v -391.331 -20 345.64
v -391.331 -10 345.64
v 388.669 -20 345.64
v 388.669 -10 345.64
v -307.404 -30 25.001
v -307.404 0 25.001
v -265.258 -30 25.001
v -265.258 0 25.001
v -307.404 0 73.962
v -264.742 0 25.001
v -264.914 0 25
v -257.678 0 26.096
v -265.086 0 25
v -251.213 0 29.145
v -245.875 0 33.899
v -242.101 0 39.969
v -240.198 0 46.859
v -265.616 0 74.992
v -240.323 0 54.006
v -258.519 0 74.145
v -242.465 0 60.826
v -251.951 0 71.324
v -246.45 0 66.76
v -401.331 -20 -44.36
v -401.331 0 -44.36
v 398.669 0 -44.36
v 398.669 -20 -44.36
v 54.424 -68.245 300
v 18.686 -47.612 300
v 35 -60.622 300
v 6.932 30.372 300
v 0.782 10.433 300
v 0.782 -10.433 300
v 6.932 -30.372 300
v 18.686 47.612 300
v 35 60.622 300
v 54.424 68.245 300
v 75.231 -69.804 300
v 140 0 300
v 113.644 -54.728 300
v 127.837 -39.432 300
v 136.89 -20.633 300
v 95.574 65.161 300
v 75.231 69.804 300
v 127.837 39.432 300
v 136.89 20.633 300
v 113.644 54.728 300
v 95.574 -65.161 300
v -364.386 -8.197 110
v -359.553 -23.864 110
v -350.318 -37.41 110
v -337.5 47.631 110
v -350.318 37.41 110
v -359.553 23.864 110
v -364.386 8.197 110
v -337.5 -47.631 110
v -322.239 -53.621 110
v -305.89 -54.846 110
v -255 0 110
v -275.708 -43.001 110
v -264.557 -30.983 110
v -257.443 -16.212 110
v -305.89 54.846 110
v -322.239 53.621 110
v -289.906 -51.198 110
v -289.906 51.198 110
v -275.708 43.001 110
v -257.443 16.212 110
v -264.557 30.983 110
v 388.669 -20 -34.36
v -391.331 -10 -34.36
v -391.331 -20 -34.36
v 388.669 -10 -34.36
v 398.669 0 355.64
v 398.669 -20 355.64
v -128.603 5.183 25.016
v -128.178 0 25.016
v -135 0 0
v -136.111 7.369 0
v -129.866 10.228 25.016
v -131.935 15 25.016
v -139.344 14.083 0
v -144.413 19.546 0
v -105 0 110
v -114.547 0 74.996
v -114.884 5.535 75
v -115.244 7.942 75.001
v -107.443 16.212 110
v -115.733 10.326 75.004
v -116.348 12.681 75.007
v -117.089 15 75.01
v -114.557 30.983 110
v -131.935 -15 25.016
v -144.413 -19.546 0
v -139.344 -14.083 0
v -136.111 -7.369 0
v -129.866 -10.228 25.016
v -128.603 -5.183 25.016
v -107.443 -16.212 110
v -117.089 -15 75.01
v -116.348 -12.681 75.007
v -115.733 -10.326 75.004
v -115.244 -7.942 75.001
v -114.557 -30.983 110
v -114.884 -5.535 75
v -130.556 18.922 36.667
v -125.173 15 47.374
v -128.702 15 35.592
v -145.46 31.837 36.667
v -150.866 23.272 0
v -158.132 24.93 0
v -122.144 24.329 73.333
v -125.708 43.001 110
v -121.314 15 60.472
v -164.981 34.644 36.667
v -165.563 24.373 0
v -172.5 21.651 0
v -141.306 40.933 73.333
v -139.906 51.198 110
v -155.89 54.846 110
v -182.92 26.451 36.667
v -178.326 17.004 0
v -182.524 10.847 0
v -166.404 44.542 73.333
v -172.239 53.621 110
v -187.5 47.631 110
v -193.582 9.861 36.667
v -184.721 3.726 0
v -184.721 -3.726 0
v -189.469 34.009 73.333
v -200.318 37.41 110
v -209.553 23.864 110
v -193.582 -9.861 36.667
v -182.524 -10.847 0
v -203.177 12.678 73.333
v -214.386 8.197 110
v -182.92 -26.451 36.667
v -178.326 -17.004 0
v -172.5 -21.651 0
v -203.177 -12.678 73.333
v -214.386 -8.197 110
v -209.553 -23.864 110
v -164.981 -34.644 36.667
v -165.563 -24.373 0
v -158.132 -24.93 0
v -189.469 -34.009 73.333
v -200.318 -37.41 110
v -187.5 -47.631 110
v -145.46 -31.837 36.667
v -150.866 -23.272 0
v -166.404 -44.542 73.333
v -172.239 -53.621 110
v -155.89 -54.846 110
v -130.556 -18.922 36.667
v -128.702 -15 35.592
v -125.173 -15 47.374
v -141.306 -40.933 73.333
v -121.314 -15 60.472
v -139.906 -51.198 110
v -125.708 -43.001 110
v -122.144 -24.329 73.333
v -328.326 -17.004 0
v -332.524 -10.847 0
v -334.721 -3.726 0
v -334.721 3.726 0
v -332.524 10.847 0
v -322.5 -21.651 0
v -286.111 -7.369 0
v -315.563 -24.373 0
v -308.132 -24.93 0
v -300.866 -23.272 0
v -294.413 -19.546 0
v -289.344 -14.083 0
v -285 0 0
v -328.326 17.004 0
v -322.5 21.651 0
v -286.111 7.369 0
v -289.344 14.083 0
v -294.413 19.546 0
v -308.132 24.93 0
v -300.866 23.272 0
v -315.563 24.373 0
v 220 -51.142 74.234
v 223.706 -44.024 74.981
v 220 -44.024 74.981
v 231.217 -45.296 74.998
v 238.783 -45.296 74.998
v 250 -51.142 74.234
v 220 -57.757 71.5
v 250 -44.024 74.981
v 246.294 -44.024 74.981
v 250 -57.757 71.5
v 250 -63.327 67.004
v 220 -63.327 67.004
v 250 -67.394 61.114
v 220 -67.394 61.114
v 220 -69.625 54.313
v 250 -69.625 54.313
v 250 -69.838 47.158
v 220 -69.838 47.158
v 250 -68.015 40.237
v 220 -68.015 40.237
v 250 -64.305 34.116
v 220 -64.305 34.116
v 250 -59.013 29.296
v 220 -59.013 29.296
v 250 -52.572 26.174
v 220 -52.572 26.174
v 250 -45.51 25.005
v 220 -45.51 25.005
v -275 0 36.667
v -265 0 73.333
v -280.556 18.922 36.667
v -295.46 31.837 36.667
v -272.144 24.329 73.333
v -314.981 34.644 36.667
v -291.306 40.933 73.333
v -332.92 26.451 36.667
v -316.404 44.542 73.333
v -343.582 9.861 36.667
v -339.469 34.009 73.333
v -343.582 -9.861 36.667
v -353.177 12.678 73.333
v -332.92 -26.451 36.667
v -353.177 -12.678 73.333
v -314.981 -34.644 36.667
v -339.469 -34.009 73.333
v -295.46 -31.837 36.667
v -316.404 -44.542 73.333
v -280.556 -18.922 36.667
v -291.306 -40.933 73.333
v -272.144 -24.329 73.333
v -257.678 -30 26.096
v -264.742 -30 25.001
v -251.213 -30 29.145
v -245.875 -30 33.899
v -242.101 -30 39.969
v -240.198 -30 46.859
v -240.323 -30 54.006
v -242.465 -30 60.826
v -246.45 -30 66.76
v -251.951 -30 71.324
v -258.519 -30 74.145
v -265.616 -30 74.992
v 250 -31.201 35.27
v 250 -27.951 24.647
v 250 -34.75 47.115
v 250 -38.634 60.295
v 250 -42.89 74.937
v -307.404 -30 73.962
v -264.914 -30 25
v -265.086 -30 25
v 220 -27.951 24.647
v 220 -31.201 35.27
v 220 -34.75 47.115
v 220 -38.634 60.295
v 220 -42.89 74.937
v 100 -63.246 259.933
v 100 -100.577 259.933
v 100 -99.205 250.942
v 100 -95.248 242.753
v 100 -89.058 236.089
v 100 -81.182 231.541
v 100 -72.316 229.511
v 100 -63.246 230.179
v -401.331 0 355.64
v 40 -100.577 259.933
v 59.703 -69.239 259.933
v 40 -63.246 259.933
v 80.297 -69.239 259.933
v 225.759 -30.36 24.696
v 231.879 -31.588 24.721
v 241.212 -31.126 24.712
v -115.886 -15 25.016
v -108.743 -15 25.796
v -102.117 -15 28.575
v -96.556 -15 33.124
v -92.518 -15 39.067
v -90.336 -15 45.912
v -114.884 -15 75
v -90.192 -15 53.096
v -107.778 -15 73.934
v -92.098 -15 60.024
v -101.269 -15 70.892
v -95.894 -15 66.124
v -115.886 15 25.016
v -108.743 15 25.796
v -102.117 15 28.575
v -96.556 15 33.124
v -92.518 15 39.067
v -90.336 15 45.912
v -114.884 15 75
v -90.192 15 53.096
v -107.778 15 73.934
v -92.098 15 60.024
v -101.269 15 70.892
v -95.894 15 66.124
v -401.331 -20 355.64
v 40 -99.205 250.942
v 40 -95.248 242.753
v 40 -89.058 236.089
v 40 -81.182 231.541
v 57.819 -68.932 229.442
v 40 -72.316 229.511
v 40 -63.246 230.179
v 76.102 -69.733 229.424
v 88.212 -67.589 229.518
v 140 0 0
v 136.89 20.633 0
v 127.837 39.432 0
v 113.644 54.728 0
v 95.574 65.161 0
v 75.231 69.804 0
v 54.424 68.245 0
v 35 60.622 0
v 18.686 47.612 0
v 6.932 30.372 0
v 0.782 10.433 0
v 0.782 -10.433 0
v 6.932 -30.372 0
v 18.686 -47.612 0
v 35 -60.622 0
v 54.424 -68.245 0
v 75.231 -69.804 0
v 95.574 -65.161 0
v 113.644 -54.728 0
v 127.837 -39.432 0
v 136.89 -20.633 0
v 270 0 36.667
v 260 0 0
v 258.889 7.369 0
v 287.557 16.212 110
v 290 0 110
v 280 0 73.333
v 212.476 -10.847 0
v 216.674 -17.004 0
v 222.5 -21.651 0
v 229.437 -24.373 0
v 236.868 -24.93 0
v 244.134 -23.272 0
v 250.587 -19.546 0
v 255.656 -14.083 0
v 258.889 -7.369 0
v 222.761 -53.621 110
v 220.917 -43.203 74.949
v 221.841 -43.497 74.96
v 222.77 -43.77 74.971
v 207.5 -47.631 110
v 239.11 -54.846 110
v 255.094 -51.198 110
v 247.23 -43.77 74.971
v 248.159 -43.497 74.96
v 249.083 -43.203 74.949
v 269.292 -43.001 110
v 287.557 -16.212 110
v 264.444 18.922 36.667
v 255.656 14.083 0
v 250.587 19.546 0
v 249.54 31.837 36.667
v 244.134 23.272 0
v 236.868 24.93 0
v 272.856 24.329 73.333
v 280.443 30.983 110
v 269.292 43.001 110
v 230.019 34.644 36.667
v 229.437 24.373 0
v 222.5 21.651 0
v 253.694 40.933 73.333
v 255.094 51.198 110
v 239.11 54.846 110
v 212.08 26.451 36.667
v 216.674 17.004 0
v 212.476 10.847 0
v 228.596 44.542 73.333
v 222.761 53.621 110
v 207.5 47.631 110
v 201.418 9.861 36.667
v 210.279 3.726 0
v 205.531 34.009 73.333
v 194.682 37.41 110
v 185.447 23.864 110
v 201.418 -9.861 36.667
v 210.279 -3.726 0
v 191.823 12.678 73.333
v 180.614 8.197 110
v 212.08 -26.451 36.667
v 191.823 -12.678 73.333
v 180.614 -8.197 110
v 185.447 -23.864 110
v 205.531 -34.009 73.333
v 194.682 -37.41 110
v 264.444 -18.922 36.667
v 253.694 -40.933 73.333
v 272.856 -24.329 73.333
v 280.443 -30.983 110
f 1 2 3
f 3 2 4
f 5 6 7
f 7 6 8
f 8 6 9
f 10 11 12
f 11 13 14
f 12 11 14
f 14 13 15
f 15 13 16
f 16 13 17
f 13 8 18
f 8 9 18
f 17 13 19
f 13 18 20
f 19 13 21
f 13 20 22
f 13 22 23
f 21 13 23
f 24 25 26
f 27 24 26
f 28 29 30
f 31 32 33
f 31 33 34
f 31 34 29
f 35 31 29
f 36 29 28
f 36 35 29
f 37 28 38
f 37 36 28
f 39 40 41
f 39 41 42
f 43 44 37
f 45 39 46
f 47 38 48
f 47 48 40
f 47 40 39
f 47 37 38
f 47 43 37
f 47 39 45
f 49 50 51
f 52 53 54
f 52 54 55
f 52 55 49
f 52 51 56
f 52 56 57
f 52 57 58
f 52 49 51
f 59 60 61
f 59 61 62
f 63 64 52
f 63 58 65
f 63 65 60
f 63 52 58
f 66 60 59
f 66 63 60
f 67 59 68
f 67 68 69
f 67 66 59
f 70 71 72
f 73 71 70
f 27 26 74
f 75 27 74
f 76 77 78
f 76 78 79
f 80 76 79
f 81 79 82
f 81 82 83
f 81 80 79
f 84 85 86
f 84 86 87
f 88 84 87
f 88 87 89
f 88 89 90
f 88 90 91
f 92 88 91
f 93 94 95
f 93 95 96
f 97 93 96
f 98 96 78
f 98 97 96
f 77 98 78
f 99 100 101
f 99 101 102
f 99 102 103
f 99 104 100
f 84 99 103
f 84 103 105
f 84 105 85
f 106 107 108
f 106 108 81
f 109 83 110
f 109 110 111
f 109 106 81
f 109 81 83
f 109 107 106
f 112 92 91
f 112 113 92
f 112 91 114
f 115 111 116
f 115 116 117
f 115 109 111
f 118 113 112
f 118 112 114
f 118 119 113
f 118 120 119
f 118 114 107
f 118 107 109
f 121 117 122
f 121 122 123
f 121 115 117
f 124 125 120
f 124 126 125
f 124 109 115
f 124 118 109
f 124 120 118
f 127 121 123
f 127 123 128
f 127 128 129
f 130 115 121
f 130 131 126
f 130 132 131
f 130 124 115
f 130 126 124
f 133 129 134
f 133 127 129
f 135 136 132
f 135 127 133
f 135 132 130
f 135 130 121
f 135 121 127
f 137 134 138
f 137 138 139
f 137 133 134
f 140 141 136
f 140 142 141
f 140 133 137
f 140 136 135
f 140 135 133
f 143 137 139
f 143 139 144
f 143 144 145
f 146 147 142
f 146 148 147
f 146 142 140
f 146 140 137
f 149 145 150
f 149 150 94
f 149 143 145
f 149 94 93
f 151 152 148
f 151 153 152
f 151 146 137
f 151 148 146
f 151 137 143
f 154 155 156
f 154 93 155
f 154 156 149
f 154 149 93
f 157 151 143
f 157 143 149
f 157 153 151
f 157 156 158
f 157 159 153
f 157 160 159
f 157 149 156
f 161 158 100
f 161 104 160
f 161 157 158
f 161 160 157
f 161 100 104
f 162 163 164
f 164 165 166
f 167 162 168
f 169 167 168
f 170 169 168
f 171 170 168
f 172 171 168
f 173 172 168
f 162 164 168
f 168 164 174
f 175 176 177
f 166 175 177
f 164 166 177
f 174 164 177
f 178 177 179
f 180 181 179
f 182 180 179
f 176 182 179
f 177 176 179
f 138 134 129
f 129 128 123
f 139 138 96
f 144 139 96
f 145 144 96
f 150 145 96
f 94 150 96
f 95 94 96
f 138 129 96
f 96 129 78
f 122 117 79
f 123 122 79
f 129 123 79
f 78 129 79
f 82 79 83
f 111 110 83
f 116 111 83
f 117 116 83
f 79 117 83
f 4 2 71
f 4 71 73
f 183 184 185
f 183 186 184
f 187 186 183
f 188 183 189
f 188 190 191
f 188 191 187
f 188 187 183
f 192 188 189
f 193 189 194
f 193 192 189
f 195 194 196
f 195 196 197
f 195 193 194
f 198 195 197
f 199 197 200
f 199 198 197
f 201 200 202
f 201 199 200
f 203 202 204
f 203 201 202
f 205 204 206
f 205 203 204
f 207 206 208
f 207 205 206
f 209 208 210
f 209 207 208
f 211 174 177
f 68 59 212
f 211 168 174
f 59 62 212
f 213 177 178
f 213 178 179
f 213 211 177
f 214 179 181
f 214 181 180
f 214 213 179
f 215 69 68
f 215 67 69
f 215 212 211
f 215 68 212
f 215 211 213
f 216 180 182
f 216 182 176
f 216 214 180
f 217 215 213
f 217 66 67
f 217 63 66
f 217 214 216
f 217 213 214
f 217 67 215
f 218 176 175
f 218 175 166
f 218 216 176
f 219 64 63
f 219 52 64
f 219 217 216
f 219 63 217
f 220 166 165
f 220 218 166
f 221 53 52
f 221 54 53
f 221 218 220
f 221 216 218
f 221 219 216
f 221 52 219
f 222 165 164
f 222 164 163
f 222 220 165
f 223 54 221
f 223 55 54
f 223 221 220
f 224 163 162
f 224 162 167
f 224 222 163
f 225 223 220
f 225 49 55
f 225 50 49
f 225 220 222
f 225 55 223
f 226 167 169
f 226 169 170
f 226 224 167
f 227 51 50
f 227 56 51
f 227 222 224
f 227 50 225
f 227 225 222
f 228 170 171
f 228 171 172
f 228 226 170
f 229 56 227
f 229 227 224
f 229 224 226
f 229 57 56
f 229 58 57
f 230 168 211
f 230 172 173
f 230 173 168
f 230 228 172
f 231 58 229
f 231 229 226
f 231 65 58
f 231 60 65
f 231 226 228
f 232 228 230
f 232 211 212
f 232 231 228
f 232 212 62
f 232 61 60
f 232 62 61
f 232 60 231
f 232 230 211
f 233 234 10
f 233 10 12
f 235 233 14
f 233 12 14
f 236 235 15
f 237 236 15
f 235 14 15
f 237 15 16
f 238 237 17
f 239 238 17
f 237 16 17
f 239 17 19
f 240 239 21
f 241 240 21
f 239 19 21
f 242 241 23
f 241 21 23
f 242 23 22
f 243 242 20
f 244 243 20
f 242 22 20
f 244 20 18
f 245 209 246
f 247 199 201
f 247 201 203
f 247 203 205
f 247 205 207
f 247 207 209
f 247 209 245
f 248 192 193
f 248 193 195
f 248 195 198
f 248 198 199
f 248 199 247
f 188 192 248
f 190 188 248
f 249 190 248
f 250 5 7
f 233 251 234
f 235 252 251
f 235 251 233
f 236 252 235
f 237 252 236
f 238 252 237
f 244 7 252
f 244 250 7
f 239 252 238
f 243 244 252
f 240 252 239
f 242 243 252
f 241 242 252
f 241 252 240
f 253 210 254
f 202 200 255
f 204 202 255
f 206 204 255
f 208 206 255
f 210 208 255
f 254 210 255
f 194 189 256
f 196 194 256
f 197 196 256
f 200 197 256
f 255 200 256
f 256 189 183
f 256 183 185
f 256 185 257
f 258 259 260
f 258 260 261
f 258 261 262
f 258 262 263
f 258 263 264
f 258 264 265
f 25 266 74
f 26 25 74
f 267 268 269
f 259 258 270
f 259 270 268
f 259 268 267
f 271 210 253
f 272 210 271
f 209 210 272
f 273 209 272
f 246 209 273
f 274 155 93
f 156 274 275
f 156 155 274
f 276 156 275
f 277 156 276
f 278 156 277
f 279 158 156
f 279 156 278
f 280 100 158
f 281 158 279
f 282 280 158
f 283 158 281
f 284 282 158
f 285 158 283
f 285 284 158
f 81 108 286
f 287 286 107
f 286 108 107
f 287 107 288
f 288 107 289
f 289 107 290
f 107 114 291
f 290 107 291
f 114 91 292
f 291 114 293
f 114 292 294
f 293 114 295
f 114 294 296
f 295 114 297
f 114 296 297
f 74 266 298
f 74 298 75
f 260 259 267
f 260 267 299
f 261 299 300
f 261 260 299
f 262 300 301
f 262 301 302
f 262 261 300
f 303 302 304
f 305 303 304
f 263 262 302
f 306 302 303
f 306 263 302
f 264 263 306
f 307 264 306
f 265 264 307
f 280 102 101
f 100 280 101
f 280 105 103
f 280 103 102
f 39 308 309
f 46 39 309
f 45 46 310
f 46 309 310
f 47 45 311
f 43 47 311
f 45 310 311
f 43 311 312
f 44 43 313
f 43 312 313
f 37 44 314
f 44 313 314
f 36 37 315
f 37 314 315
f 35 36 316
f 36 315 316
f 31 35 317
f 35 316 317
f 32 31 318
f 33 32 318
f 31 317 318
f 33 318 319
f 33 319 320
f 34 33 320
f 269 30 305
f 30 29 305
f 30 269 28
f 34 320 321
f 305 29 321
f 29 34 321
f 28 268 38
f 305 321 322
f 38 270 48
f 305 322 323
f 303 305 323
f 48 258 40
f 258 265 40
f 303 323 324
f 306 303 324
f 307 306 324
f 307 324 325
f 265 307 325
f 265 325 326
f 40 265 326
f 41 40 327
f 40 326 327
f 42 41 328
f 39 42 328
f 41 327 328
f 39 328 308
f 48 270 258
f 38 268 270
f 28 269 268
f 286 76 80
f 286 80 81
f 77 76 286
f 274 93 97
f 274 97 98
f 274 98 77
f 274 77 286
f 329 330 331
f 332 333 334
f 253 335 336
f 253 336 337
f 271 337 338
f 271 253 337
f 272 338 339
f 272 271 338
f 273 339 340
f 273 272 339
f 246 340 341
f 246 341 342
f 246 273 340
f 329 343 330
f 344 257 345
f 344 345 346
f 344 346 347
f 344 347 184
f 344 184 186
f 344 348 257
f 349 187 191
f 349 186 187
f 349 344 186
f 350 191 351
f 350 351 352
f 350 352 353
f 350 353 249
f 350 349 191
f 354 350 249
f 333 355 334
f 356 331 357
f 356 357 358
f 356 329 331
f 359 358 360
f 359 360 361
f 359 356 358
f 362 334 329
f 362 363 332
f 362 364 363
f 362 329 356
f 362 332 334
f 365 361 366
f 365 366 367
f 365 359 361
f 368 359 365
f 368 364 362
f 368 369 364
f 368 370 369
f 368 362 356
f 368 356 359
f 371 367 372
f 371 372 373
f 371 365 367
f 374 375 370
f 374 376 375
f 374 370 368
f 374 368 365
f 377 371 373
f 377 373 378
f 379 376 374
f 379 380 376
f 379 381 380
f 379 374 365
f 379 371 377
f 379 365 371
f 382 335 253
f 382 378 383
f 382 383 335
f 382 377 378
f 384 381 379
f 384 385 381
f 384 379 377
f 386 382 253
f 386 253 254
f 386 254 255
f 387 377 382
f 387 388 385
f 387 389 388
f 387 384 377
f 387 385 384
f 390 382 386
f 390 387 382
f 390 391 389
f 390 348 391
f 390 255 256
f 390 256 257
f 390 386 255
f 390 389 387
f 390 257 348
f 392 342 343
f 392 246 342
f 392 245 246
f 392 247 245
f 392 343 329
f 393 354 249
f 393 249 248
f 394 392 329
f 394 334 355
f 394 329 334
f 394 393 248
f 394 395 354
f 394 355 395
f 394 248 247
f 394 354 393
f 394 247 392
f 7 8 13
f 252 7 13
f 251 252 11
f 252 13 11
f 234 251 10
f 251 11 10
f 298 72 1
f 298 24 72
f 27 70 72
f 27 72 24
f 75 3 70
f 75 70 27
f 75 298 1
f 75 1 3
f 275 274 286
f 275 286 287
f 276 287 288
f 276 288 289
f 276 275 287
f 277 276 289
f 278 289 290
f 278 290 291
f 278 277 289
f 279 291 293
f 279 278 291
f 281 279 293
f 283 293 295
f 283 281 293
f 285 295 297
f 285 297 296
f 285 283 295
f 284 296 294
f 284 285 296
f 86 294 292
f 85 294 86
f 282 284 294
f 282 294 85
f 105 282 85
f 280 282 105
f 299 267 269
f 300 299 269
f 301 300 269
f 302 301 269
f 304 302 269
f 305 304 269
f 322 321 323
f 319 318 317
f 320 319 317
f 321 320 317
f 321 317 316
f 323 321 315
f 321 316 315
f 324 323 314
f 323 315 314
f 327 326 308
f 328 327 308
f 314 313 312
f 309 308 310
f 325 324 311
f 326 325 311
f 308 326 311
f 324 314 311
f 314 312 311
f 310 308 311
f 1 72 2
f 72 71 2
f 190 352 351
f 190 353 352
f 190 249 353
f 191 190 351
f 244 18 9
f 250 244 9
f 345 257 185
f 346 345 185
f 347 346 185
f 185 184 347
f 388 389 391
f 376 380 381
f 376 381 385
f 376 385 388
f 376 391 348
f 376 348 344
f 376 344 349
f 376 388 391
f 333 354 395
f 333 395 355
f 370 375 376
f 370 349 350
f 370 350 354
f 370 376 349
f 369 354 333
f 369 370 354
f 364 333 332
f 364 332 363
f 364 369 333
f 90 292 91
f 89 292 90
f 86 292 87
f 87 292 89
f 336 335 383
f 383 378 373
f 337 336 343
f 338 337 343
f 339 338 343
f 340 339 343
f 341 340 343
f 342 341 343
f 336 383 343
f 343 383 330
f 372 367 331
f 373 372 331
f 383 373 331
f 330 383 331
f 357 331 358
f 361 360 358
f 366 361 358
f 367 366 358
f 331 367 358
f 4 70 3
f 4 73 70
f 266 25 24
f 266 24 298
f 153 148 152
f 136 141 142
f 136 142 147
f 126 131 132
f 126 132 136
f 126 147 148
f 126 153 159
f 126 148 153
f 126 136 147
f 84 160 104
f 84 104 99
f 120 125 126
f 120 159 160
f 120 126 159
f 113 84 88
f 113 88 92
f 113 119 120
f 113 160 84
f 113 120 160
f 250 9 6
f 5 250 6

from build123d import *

# Parameters (mm, degrees)
F1_R      = 70
F2_DEPTH  = 300
F3_R      = 25
F4_R      = 55
F6_R      = 25
F7_R      = 55
F9_R      = 25
F10_R     = 55
F14_DEPTH = 30
F17_DEPTH = 15
F19_DEPTH = 15
F21_DEPTH = 30
F22_W     = 800
F22_H     = 400
F24_DEPTH = 20
F25_T     = -10


# Not quite as in the source:
# - a feature names something its author has since deleted; it is built from what else it names


with BuildPart() as f2:
    # F1 (on Top) → F2 (new body)
    with BuildSketch(Plane.XY):
        with Locations((70, 0)):
            Circle(F1_R)
    extrude(amount=F2_DEPTH)

    # F13 (on offset) → F14 (join, symmetric)
    with BuildSketch(Plane.YZ.offset(70)):
        with BuildLine():
            Line((-39.4232119037, 259.9333557068), (-100.5767880963, 259.9333557068))
            ThreePointArc((-100.5767880963, 259.9333557068), (-70, 229.4231392758), (-39.4232119037, 259.9333557068))
        make_face()
    extrude(amount=F14_DEPTH, both=True)


with BuildPart() as f5:
    # F3 (on Top) → F5 section 0
    with BuildSketch(Plane.XY):
        with Locations((235, 0)):
            Circle(F3_R)
    # F4 (on offset) → F5 section 1
    with BuildSketch(Plane.XY.offset(110)):
        with Locations((235, 0)):
            Circle(F4_R)
    loft()

    # F16 (on offset) → F17 (join, symmetric)
    with BuildSketch(Plane.YZ.offset(235)):
        with BuildLine():
            Line((-13.6413012409, 73.7935081125), (-44.023681798, 74.9809287811))
            ThreePointArc((-44.023681798, 74.9809287811), (-69.9889457828, 50.7433630762), (-45.5103433285, 25.005209549))
            Line((-45.5103433285, 25.005209549), (-13.6413012409, 24.3545078339))
            Line((-13.6413012409, 24.3545078339), (-13.6413012409, 73.7935081125))
        make_face()
    extrude(amount=F17_DEPTH, both=True)


with BuildPart() as f8:
    # F6 (on Top) → F8 section 0
    with BuildSketch(Plane.XY):
        with Locations((-160, 0)):
            Circle(F6_R)
    # F7 (on offset) → F8 section 1
    with BuildSketch(Plane.XY.offset(110)):
        with Locations((-160, 0)):
            Circle(F7_R)
    loft()

    # F18 (on Front) → F19 (join, symmetric)
    with BuildSketch(Plane.XZ):
        with BuildLine():
            Line((-153.4072975938, 25.0156882073), (-115.885530489, 25.0156882073))
            ThreePointArc((-115.885530489, 25.0156882073), (-90.0050194353, 49.4990543238), (-114.8837577761, 74.9997297534))
            Line((-114.8837577761, 74.9997297534), (-153.4072975938, 75.1788541675))
            Line((-153.4072975938, 75.1788541675), (-153.4072975938, 25.0156882073))
        make_face()
    extrude(amount=F19_DEPTH, both=True)


with BuildPart() as f11:
    # F9 (on Top) → F11 section 0
    with BuildSketch(Plane.XY):
        with Locations((-310, 0)):
            Circle(F9_R)
    # F10 (on offset) → F11 section 1
    with BuildSketch(Plane.XY.offset(110)):
        with Locations((-310, 0)):
            Circle(F10_R)
    loft()


with BuildPart() as f21:
    # F20 (on Front) → F21 (new body)
    with BuildSketch(Plane.XZ):
        with BuildLine():
            Line((-264.7419169597, 25.0013321726), (-265.2580830403, 25.0013321726))
            ThreePointArc((-265.2580830403, 25.0013321726), (-265, 25), (-264.7419169597, 25.0013321726))
        make_face()
        with BuildLine():
            Line((-307.4041914523, 25.0013321726), (-265.2580830403, 25.0013321726))
            Line((-265.2580830403, 25.0013321726), (-264.7419169597, 25.0013321726))
            ThreePointArc((-264.7419169597, 25.0013321726), (-240.0038230126, 50.4371910495), (-265.6162766145, 74.9924029084))
            Line((-265.6162766145, 74.9924029084), (-307.4041914523, 73.9619731903))
            Line((-307.4041914523, 73.9619731903), (-307.4041914523, 25.0013321726))
        make_face()
    extrude(amount=F21_DEPTH)


with BuildPart() as f24:
    # F22 (on Front) → F24 (new body)
    with BuildSketch(Plane.XZ):
        with Locations((-1.331, 155.6396274999)):
            Rectangle(F22_W, F22_H)
    extrude(amount=F24_DEPTH)

    # F25
    f25_openings = [f24.faces().sort_by_distance(p)[0] for p in [
        (-1.331, -20, 155.639627),
    ]]
    offset(amount=F25_T, openings=f25_openings)


solid = Compound([f2.part, f5.part, f8.part, f11.part, f21.part, f24.part])
